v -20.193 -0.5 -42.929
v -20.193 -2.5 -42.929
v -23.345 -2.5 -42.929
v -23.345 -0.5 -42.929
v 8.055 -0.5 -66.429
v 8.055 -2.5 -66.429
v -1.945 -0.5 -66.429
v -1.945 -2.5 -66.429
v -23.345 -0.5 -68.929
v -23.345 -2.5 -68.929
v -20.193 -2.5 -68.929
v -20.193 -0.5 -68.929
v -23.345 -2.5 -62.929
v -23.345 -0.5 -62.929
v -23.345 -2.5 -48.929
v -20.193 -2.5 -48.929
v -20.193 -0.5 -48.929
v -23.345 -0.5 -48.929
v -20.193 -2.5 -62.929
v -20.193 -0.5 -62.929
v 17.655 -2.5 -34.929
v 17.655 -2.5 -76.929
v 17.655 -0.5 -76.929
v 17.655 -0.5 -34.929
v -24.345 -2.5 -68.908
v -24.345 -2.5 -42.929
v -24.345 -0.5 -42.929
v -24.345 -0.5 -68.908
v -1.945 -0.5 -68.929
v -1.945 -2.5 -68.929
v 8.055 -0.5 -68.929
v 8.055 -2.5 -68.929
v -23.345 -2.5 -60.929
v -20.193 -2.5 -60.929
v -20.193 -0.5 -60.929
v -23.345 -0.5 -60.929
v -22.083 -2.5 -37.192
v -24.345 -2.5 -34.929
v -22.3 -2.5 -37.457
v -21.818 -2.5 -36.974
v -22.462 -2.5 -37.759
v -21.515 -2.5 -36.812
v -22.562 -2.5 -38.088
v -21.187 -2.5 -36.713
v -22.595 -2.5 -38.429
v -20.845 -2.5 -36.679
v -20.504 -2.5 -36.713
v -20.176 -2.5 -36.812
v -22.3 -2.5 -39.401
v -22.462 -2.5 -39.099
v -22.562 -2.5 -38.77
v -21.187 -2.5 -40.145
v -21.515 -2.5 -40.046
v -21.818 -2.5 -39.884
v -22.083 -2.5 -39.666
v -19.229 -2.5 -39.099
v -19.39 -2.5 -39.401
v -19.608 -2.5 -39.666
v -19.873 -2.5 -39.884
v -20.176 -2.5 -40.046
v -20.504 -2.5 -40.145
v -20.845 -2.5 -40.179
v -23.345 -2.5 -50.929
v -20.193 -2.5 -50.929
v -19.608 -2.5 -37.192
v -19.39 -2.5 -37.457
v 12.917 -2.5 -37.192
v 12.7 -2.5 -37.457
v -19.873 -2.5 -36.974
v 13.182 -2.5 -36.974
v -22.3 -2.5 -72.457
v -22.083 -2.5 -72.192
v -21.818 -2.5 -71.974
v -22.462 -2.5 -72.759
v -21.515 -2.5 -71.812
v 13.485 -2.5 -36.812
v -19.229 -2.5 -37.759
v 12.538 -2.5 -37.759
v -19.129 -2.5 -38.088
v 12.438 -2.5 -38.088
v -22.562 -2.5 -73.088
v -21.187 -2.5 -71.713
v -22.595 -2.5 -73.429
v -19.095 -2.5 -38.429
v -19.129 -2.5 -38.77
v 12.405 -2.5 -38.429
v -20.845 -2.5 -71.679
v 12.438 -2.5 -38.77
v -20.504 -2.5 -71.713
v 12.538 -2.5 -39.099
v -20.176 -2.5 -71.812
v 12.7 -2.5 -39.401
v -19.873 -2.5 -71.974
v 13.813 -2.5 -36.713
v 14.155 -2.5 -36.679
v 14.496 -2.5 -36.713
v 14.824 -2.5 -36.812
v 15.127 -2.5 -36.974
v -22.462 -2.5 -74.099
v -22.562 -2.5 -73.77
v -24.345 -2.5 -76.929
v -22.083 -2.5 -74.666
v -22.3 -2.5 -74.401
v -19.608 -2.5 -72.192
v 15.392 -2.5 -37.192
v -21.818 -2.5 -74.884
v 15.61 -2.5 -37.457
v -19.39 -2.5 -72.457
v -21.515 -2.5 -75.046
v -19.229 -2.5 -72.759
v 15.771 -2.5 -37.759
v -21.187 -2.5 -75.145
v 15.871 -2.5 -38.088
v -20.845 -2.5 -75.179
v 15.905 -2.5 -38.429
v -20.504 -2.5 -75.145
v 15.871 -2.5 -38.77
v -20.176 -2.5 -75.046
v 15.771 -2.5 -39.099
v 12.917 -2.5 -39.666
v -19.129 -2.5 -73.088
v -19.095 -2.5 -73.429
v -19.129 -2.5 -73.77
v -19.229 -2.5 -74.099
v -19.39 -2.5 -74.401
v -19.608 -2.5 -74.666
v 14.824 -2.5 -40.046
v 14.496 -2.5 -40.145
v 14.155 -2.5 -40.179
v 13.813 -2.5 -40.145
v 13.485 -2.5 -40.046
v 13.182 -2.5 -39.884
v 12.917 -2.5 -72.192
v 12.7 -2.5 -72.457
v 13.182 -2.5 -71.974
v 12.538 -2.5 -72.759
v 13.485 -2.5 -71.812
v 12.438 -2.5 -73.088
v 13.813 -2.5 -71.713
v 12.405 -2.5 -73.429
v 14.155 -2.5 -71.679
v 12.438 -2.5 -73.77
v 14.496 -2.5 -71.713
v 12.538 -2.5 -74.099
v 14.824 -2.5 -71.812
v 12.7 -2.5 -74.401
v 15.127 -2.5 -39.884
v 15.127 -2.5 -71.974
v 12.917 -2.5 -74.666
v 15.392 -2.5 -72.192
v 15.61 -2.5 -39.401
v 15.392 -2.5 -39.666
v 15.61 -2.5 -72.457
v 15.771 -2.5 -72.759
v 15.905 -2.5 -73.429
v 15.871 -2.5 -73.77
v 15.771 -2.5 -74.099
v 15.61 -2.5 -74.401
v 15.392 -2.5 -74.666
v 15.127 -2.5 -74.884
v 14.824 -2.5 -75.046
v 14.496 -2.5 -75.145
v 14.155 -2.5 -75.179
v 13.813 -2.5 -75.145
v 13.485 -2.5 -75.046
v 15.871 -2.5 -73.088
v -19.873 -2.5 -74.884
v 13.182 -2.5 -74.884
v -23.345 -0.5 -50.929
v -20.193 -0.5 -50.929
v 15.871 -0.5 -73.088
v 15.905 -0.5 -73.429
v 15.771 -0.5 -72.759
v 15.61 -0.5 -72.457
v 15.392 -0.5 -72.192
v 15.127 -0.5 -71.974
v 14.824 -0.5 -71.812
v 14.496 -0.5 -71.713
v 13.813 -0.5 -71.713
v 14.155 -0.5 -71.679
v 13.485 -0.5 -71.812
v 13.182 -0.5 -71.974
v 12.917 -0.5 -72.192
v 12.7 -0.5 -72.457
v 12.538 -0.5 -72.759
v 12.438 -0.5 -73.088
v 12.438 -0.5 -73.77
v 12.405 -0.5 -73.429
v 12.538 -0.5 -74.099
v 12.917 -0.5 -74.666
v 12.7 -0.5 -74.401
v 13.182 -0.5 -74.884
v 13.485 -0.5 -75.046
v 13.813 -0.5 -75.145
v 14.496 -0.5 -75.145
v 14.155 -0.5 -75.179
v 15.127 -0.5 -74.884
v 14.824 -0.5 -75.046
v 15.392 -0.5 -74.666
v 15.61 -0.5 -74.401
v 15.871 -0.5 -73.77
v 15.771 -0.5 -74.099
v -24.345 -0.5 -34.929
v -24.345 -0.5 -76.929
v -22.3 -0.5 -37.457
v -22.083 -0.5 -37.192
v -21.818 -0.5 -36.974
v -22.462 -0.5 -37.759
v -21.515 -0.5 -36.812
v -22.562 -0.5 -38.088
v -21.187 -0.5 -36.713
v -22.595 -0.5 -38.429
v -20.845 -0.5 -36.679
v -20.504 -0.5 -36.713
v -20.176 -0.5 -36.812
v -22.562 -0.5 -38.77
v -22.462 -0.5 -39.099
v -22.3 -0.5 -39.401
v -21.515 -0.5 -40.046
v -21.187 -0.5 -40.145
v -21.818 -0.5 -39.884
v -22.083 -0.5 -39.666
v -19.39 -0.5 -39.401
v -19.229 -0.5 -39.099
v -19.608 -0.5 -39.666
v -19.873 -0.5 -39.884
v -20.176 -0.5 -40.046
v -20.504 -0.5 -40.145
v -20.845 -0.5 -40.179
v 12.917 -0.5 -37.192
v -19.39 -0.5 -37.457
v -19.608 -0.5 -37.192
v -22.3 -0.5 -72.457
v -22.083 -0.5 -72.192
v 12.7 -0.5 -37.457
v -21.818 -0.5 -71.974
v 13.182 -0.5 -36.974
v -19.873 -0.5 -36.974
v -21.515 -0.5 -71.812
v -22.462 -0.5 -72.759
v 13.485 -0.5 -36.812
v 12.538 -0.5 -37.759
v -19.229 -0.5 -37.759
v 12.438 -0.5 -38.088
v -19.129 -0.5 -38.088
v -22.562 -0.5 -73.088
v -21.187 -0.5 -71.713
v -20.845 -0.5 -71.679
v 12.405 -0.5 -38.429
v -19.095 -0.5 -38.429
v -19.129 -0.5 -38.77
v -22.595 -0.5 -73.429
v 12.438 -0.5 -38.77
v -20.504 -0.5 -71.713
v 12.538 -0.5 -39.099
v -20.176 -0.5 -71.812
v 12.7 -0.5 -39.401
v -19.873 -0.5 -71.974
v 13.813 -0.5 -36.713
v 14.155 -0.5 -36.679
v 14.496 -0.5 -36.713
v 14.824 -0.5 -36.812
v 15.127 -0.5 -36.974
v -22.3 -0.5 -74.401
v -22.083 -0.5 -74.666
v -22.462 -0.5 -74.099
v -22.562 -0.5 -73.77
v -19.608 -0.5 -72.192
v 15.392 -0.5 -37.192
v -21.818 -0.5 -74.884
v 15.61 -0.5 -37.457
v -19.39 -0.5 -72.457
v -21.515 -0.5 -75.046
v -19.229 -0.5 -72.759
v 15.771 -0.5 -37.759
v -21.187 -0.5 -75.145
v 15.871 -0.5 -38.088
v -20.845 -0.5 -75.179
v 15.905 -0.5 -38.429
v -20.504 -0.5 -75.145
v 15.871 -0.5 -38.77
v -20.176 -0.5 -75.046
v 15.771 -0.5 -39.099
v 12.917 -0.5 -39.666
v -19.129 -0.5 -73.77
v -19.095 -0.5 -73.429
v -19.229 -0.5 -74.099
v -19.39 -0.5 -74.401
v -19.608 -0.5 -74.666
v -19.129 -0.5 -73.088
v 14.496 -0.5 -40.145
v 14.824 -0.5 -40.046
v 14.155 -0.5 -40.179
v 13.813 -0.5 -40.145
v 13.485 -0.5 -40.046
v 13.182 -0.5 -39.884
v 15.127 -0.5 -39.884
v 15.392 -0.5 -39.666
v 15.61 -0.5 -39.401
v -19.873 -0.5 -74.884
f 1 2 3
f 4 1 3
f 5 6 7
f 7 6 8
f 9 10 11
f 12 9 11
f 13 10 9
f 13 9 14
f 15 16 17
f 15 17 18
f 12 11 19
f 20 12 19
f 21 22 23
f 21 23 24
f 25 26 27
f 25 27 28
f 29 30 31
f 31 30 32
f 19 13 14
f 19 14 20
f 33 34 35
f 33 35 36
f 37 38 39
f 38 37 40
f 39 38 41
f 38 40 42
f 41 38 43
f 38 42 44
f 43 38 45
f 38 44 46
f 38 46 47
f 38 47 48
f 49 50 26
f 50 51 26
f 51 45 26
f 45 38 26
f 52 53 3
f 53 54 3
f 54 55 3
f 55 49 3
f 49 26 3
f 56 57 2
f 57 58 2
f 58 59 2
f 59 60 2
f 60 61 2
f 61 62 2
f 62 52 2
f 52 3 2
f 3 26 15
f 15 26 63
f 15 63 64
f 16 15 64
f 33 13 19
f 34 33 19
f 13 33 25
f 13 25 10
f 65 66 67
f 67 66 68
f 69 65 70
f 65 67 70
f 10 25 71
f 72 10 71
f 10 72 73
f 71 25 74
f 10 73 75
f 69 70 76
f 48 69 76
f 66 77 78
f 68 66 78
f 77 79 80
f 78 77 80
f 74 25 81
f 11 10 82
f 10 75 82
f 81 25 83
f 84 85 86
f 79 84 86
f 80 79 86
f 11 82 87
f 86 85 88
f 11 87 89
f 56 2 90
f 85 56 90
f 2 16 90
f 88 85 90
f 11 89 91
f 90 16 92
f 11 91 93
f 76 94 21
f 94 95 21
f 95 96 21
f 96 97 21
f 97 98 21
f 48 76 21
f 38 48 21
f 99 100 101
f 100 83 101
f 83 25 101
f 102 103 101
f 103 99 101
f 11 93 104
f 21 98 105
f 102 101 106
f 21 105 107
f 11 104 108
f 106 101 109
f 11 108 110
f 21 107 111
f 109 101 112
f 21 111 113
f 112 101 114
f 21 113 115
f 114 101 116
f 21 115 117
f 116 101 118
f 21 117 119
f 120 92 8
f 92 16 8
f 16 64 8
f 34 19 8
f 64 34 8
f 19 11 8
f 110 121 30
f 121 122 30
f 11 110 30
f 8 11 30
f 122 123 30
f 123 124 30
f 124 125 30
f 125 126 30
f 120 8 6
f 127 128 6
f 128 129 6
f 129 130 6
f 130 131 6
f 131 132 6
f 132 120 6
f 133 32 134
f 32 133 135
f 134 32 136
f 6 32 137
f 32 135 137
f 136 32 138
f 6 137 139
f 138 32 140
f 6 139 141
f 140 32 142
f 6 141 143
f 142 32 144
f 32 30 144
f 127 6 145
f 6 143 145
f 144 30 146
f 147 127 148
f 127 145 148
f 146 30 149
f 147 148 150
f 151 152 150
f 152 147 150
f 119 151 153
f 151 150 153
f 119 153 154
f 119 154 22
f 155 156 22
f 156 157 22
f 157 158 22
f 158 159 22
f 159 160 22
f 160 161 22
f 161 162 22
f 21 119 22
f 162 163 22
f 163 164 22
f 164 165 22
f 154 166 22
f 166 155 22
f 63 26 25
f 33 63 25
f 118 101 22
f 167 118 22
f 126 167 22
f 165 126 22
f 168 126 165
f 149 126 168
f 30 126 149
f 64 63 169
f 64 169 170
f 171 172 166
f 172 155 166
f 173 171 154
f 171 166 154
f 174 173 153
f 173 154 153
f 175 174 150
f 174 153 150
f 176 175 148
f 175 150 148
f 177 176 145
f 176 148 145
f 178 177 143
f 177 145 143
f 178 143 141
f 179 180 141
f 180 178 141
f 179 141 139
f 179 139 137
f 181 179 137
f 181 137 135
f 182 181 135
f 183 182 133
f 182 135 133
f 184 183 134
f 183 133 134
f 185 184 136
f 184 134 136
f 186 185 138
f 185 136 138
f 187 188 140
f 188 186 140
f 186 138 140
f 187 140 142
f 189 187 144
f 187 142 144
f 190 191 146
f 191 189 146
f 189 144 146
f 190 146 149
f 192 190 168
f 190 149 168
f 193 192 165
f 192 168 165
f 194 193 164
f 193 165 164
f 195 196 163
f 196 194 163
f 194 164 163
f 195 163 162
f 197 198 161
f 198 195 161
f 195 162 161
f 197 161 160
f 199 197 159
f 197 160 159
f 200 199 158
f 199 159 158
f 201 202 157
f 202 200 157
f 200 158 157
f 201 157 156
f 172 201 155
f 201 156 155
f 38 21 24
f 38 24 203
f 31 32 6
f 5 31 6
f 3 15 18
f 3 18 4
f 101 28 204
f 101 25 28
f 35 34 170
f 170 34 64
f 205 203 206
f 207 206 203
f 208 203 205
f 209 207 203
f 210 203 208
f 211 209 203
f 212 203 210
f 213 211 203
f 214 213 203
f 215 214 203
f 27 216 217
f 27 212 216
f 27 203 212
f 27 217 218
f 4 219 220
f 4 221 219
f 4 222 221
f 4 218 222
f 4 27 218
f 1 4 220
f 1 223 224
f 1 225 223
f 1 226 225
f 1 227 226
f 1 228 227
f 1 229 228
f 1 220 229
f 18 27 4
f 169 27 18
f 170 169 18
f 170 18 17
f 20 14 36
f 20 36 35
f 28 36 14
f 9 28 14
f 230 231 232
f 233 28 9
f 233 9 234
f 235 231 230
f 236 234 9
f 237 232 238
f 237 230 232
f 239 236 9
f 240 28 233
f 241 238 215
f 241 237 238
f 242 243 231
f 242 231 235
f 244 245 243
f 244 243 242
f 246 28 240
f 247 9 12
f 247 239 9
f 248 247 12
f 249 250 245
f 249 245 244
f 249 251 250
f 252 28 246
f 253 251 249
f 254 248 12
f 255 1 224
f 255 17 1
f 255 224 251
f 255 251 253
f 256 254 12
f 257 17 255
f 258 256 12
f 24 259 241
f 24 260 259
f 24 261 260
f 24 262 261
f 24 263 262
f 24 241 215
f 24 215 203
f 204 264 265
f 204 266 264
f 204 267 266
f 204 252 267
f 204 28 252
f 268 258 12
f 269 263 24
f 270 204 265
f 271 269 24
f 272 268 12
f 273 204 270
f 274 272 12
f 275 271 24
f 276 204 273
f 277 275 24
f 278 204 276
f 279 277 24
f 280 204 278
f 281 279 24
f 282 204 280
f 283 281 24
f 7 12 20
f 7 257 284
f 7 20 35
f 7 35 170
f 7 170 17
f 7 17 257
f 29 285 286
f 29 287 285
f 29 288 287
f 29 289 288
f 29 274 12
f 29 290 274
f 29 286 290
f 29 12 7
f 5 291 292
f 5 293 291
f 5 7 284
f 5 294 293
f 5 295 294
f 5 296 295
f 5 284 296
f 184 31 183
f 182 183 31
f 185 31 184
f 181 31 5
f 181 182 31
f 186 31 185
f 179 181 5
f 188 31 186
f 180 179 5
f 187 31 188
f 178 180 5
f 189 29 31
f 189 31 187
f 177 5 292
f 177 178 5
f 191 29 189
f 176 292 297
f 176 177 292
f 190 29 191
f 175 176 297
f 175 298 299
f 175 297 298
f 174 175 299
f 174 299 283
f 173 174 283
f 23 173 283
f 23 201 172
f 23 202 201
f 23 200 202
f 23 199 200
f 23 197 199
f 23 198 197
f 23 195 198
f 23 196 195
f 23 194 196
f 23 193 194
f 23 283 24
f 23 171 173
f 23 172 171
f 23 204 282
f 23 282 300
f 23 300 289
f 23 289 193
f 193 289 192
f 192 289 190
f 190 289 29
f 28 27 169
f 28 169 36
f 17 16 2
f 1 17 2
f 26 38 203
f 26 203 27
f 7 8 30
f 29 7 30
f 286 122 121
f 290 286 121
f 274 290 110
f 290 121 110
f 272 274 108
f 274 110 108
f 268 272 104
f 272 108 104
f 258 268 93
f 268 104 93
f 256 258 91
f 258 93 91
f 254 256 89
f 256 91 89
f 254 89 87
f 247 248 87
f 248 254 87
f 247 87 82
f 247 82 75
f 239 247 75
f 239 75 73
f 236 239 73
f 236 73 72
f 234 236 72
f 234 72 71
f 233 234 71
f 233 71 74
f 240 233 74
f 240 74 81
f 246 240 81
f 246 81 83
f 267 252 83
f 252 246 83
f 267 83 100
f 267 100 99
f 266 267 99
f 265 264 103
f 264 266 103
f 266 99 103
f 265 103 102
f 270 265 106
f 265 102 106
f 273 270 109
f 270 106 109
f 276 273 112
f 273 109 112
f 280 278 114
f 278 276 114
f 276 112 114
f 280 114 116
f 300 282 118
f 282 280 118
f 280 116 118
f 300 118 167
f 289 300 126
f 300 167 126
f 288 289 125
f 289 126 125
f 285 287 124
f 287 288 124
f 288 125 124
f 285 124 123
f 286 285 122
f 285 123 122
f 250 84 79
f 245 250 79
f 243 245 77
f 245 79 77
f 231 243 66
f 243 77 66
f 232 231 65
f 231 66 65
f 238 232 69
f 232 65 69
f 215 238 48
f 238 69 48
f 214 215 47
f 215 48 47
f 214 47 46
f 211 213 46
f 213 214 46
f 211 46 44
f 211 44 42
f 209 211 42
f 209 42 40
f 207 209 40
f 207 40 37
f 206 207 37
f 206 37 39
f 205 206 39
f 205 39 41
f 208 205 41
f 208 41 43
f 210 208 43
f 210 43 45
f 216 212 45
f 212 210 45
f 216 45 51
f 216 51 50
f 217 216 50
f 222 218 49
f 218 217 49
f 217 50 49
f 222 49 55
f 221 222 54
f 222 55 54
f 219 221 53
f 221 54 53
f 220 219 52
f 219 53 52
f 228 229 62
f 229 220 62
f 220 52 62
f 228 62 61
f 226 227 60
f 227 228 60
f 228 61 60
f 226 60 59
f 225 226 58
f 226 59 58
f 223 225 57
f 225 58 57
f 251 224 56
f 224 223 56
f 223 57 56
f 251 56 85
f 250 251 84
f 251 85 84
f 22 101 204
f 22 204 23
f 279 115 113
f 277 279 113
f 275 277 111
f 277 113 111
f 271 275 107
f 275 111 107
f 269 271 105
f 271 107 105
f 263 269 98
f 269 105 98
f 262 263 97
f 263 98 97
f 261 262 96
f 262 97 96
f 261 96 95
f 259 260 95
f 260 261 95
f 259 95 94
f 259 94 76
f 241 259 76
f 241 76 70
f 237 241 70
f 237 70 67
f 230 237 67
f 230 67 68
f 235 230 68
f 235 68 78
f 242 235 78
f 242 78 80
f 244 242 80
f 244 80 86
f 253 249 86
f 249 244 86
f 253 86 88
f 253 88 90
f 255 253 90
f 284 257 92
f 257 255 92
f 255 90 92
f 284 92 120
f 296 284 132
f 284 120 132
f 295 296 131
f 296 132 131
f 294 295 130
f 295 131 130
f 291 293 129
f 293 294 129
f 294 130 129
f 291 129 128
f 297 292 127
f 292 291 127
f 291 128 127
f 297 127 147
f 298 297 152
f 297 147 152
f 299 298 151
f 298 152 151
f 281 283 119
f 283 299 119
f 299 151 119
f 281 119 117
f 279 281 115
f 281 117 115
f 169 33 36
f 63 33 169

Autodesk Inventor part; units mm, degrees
ref_plane "YZ Plane" through (0, 0, 0) normal (1, 0, 0) x (0, 1, 0)
ref_plane "XZ Plane" through (0, 0, 0) normal (0, 1, 0) x (-1, 0, 0)
ref_plane "XY Plane" through (0, 0, 0) normal (0, 0, 1) x (1, 0, 0)
ref_plane "Work Plane1" through (0, -2.5, 0) normal (0, 1, 0) x (1, 0, 0)
sketch "Sketch10" plane through (0, -2.5, 0) normal (0, 1, 0) x (1, 0, 0)
  line L0 (-24.3453, 76.929) -> (17.6547, 76.929)
  line L1 (17.6547, 76.929) -> (17.6547, 34.929)
  line L2 (17.6547, 34.929) -> (-24.3453, 34.929)
  line L3 (-24.3453, 34.929) -> (-24.3453, 76.929)
  circle A0 centre (-20.8453, 73.429) radius 1.75
  circle A1 centre (14.1547, 73.429) radius 1.75
  circle A2 centre (14.1547, 38.429) radius 1.75
  circle A3 centre (-20.8453, 38.429) radius 1.75
  line L4 (-23.3453, 68.929) -> (-20.1928, 68.929)
  line L5 (-20.1928, 68.929) -> (-20.1928, 42.929)
  line L6 (-20.1928, 42.929) -> (-23.3453, 42.929)
  line L7 (-24.3453, 42.929) -> (-24.3453, 68.9078)
  line L8 (-1.9453, 68.929) -> (8.0547, 68.929)
  line L9 (8.0547, 68.929) -> (8.0547, 66.429)
  line L10 (8.0547, 66.429) -> (-1.9453, 66.429)
  line L11 (-1.9453, 66.429) -> (-1.9453, 68.929)
  line L12 (-23.3453, 62.929) -> (-20.1928, 62.929)
  line L13 (-20.1928, 62.929) -> (-20.1928, 60.929)
  line L14 (-20.1928, 60.929) -> (-23.3453, 60.929)
  line L15 (-23.3453, 50.929) -> (-20.1928, 50.929)
  line L16 (-20.1928, 50.929) -> (-20.1928, 48.929)
  line L17 (-20.1928, 48.929) -> (-23.3453, 48.929)
  line L18 (-23.3453, 68.929) -> (-23.3453, 62.929)
  line L19 (-23.3453, 60.929) -> (-23.3453, 50.929)
  line L20 (-23.3453, 48.929) -> (-23.3453, 42.929)
  point P0 (0, 0)
  point P1 (8.0547, 67.679)
  point P2 (-21.769, 68.929)
  point P3 (-21.769, 62.929)
  point P4 (-21.769, 48.929)
  point P5 (-21.769, 50.929)
  point P6 (-21.769, 42.929)
  dimension "d76" = 42
  dimension "d77" = 42
  dimension "d78" = 3.5
  dimension "d79" = 3.5
  dimension "d80" = 3.5
  dimension "d81" = 3.5
  dimension "d82" = 3.5
  dimension "d83" = 3.5
  dimension "d84" = 3.5
  dimension "d85" = 3.5
  dimension "d86" = 3.5
  dimension "d88" = 10
  dimension "d89" = 2.5
  dimension "d90" = 8
  dimension "d91" = 9.6
  dimension "d92" = 6
  dimension "d93" = 2
  dimension "d94" = 2
  dimension "d95" = 6
  dimension "d96" = 8
  dimension "d97" = 8
extrude "Extrusion9" add sketch "Sketch10" along normal blind 2
equation "\"d80\" = d79"
equation "\"d81\" = d80"
equation "\"d82\" = d80"
equation "\"d83\" = d80"
equation "\"d84\" = d83"
equation "\"d85\" = d80"
equation "\"d86\" = d80"
equation "\"d94\" = d93"
properties part number "display_base"
